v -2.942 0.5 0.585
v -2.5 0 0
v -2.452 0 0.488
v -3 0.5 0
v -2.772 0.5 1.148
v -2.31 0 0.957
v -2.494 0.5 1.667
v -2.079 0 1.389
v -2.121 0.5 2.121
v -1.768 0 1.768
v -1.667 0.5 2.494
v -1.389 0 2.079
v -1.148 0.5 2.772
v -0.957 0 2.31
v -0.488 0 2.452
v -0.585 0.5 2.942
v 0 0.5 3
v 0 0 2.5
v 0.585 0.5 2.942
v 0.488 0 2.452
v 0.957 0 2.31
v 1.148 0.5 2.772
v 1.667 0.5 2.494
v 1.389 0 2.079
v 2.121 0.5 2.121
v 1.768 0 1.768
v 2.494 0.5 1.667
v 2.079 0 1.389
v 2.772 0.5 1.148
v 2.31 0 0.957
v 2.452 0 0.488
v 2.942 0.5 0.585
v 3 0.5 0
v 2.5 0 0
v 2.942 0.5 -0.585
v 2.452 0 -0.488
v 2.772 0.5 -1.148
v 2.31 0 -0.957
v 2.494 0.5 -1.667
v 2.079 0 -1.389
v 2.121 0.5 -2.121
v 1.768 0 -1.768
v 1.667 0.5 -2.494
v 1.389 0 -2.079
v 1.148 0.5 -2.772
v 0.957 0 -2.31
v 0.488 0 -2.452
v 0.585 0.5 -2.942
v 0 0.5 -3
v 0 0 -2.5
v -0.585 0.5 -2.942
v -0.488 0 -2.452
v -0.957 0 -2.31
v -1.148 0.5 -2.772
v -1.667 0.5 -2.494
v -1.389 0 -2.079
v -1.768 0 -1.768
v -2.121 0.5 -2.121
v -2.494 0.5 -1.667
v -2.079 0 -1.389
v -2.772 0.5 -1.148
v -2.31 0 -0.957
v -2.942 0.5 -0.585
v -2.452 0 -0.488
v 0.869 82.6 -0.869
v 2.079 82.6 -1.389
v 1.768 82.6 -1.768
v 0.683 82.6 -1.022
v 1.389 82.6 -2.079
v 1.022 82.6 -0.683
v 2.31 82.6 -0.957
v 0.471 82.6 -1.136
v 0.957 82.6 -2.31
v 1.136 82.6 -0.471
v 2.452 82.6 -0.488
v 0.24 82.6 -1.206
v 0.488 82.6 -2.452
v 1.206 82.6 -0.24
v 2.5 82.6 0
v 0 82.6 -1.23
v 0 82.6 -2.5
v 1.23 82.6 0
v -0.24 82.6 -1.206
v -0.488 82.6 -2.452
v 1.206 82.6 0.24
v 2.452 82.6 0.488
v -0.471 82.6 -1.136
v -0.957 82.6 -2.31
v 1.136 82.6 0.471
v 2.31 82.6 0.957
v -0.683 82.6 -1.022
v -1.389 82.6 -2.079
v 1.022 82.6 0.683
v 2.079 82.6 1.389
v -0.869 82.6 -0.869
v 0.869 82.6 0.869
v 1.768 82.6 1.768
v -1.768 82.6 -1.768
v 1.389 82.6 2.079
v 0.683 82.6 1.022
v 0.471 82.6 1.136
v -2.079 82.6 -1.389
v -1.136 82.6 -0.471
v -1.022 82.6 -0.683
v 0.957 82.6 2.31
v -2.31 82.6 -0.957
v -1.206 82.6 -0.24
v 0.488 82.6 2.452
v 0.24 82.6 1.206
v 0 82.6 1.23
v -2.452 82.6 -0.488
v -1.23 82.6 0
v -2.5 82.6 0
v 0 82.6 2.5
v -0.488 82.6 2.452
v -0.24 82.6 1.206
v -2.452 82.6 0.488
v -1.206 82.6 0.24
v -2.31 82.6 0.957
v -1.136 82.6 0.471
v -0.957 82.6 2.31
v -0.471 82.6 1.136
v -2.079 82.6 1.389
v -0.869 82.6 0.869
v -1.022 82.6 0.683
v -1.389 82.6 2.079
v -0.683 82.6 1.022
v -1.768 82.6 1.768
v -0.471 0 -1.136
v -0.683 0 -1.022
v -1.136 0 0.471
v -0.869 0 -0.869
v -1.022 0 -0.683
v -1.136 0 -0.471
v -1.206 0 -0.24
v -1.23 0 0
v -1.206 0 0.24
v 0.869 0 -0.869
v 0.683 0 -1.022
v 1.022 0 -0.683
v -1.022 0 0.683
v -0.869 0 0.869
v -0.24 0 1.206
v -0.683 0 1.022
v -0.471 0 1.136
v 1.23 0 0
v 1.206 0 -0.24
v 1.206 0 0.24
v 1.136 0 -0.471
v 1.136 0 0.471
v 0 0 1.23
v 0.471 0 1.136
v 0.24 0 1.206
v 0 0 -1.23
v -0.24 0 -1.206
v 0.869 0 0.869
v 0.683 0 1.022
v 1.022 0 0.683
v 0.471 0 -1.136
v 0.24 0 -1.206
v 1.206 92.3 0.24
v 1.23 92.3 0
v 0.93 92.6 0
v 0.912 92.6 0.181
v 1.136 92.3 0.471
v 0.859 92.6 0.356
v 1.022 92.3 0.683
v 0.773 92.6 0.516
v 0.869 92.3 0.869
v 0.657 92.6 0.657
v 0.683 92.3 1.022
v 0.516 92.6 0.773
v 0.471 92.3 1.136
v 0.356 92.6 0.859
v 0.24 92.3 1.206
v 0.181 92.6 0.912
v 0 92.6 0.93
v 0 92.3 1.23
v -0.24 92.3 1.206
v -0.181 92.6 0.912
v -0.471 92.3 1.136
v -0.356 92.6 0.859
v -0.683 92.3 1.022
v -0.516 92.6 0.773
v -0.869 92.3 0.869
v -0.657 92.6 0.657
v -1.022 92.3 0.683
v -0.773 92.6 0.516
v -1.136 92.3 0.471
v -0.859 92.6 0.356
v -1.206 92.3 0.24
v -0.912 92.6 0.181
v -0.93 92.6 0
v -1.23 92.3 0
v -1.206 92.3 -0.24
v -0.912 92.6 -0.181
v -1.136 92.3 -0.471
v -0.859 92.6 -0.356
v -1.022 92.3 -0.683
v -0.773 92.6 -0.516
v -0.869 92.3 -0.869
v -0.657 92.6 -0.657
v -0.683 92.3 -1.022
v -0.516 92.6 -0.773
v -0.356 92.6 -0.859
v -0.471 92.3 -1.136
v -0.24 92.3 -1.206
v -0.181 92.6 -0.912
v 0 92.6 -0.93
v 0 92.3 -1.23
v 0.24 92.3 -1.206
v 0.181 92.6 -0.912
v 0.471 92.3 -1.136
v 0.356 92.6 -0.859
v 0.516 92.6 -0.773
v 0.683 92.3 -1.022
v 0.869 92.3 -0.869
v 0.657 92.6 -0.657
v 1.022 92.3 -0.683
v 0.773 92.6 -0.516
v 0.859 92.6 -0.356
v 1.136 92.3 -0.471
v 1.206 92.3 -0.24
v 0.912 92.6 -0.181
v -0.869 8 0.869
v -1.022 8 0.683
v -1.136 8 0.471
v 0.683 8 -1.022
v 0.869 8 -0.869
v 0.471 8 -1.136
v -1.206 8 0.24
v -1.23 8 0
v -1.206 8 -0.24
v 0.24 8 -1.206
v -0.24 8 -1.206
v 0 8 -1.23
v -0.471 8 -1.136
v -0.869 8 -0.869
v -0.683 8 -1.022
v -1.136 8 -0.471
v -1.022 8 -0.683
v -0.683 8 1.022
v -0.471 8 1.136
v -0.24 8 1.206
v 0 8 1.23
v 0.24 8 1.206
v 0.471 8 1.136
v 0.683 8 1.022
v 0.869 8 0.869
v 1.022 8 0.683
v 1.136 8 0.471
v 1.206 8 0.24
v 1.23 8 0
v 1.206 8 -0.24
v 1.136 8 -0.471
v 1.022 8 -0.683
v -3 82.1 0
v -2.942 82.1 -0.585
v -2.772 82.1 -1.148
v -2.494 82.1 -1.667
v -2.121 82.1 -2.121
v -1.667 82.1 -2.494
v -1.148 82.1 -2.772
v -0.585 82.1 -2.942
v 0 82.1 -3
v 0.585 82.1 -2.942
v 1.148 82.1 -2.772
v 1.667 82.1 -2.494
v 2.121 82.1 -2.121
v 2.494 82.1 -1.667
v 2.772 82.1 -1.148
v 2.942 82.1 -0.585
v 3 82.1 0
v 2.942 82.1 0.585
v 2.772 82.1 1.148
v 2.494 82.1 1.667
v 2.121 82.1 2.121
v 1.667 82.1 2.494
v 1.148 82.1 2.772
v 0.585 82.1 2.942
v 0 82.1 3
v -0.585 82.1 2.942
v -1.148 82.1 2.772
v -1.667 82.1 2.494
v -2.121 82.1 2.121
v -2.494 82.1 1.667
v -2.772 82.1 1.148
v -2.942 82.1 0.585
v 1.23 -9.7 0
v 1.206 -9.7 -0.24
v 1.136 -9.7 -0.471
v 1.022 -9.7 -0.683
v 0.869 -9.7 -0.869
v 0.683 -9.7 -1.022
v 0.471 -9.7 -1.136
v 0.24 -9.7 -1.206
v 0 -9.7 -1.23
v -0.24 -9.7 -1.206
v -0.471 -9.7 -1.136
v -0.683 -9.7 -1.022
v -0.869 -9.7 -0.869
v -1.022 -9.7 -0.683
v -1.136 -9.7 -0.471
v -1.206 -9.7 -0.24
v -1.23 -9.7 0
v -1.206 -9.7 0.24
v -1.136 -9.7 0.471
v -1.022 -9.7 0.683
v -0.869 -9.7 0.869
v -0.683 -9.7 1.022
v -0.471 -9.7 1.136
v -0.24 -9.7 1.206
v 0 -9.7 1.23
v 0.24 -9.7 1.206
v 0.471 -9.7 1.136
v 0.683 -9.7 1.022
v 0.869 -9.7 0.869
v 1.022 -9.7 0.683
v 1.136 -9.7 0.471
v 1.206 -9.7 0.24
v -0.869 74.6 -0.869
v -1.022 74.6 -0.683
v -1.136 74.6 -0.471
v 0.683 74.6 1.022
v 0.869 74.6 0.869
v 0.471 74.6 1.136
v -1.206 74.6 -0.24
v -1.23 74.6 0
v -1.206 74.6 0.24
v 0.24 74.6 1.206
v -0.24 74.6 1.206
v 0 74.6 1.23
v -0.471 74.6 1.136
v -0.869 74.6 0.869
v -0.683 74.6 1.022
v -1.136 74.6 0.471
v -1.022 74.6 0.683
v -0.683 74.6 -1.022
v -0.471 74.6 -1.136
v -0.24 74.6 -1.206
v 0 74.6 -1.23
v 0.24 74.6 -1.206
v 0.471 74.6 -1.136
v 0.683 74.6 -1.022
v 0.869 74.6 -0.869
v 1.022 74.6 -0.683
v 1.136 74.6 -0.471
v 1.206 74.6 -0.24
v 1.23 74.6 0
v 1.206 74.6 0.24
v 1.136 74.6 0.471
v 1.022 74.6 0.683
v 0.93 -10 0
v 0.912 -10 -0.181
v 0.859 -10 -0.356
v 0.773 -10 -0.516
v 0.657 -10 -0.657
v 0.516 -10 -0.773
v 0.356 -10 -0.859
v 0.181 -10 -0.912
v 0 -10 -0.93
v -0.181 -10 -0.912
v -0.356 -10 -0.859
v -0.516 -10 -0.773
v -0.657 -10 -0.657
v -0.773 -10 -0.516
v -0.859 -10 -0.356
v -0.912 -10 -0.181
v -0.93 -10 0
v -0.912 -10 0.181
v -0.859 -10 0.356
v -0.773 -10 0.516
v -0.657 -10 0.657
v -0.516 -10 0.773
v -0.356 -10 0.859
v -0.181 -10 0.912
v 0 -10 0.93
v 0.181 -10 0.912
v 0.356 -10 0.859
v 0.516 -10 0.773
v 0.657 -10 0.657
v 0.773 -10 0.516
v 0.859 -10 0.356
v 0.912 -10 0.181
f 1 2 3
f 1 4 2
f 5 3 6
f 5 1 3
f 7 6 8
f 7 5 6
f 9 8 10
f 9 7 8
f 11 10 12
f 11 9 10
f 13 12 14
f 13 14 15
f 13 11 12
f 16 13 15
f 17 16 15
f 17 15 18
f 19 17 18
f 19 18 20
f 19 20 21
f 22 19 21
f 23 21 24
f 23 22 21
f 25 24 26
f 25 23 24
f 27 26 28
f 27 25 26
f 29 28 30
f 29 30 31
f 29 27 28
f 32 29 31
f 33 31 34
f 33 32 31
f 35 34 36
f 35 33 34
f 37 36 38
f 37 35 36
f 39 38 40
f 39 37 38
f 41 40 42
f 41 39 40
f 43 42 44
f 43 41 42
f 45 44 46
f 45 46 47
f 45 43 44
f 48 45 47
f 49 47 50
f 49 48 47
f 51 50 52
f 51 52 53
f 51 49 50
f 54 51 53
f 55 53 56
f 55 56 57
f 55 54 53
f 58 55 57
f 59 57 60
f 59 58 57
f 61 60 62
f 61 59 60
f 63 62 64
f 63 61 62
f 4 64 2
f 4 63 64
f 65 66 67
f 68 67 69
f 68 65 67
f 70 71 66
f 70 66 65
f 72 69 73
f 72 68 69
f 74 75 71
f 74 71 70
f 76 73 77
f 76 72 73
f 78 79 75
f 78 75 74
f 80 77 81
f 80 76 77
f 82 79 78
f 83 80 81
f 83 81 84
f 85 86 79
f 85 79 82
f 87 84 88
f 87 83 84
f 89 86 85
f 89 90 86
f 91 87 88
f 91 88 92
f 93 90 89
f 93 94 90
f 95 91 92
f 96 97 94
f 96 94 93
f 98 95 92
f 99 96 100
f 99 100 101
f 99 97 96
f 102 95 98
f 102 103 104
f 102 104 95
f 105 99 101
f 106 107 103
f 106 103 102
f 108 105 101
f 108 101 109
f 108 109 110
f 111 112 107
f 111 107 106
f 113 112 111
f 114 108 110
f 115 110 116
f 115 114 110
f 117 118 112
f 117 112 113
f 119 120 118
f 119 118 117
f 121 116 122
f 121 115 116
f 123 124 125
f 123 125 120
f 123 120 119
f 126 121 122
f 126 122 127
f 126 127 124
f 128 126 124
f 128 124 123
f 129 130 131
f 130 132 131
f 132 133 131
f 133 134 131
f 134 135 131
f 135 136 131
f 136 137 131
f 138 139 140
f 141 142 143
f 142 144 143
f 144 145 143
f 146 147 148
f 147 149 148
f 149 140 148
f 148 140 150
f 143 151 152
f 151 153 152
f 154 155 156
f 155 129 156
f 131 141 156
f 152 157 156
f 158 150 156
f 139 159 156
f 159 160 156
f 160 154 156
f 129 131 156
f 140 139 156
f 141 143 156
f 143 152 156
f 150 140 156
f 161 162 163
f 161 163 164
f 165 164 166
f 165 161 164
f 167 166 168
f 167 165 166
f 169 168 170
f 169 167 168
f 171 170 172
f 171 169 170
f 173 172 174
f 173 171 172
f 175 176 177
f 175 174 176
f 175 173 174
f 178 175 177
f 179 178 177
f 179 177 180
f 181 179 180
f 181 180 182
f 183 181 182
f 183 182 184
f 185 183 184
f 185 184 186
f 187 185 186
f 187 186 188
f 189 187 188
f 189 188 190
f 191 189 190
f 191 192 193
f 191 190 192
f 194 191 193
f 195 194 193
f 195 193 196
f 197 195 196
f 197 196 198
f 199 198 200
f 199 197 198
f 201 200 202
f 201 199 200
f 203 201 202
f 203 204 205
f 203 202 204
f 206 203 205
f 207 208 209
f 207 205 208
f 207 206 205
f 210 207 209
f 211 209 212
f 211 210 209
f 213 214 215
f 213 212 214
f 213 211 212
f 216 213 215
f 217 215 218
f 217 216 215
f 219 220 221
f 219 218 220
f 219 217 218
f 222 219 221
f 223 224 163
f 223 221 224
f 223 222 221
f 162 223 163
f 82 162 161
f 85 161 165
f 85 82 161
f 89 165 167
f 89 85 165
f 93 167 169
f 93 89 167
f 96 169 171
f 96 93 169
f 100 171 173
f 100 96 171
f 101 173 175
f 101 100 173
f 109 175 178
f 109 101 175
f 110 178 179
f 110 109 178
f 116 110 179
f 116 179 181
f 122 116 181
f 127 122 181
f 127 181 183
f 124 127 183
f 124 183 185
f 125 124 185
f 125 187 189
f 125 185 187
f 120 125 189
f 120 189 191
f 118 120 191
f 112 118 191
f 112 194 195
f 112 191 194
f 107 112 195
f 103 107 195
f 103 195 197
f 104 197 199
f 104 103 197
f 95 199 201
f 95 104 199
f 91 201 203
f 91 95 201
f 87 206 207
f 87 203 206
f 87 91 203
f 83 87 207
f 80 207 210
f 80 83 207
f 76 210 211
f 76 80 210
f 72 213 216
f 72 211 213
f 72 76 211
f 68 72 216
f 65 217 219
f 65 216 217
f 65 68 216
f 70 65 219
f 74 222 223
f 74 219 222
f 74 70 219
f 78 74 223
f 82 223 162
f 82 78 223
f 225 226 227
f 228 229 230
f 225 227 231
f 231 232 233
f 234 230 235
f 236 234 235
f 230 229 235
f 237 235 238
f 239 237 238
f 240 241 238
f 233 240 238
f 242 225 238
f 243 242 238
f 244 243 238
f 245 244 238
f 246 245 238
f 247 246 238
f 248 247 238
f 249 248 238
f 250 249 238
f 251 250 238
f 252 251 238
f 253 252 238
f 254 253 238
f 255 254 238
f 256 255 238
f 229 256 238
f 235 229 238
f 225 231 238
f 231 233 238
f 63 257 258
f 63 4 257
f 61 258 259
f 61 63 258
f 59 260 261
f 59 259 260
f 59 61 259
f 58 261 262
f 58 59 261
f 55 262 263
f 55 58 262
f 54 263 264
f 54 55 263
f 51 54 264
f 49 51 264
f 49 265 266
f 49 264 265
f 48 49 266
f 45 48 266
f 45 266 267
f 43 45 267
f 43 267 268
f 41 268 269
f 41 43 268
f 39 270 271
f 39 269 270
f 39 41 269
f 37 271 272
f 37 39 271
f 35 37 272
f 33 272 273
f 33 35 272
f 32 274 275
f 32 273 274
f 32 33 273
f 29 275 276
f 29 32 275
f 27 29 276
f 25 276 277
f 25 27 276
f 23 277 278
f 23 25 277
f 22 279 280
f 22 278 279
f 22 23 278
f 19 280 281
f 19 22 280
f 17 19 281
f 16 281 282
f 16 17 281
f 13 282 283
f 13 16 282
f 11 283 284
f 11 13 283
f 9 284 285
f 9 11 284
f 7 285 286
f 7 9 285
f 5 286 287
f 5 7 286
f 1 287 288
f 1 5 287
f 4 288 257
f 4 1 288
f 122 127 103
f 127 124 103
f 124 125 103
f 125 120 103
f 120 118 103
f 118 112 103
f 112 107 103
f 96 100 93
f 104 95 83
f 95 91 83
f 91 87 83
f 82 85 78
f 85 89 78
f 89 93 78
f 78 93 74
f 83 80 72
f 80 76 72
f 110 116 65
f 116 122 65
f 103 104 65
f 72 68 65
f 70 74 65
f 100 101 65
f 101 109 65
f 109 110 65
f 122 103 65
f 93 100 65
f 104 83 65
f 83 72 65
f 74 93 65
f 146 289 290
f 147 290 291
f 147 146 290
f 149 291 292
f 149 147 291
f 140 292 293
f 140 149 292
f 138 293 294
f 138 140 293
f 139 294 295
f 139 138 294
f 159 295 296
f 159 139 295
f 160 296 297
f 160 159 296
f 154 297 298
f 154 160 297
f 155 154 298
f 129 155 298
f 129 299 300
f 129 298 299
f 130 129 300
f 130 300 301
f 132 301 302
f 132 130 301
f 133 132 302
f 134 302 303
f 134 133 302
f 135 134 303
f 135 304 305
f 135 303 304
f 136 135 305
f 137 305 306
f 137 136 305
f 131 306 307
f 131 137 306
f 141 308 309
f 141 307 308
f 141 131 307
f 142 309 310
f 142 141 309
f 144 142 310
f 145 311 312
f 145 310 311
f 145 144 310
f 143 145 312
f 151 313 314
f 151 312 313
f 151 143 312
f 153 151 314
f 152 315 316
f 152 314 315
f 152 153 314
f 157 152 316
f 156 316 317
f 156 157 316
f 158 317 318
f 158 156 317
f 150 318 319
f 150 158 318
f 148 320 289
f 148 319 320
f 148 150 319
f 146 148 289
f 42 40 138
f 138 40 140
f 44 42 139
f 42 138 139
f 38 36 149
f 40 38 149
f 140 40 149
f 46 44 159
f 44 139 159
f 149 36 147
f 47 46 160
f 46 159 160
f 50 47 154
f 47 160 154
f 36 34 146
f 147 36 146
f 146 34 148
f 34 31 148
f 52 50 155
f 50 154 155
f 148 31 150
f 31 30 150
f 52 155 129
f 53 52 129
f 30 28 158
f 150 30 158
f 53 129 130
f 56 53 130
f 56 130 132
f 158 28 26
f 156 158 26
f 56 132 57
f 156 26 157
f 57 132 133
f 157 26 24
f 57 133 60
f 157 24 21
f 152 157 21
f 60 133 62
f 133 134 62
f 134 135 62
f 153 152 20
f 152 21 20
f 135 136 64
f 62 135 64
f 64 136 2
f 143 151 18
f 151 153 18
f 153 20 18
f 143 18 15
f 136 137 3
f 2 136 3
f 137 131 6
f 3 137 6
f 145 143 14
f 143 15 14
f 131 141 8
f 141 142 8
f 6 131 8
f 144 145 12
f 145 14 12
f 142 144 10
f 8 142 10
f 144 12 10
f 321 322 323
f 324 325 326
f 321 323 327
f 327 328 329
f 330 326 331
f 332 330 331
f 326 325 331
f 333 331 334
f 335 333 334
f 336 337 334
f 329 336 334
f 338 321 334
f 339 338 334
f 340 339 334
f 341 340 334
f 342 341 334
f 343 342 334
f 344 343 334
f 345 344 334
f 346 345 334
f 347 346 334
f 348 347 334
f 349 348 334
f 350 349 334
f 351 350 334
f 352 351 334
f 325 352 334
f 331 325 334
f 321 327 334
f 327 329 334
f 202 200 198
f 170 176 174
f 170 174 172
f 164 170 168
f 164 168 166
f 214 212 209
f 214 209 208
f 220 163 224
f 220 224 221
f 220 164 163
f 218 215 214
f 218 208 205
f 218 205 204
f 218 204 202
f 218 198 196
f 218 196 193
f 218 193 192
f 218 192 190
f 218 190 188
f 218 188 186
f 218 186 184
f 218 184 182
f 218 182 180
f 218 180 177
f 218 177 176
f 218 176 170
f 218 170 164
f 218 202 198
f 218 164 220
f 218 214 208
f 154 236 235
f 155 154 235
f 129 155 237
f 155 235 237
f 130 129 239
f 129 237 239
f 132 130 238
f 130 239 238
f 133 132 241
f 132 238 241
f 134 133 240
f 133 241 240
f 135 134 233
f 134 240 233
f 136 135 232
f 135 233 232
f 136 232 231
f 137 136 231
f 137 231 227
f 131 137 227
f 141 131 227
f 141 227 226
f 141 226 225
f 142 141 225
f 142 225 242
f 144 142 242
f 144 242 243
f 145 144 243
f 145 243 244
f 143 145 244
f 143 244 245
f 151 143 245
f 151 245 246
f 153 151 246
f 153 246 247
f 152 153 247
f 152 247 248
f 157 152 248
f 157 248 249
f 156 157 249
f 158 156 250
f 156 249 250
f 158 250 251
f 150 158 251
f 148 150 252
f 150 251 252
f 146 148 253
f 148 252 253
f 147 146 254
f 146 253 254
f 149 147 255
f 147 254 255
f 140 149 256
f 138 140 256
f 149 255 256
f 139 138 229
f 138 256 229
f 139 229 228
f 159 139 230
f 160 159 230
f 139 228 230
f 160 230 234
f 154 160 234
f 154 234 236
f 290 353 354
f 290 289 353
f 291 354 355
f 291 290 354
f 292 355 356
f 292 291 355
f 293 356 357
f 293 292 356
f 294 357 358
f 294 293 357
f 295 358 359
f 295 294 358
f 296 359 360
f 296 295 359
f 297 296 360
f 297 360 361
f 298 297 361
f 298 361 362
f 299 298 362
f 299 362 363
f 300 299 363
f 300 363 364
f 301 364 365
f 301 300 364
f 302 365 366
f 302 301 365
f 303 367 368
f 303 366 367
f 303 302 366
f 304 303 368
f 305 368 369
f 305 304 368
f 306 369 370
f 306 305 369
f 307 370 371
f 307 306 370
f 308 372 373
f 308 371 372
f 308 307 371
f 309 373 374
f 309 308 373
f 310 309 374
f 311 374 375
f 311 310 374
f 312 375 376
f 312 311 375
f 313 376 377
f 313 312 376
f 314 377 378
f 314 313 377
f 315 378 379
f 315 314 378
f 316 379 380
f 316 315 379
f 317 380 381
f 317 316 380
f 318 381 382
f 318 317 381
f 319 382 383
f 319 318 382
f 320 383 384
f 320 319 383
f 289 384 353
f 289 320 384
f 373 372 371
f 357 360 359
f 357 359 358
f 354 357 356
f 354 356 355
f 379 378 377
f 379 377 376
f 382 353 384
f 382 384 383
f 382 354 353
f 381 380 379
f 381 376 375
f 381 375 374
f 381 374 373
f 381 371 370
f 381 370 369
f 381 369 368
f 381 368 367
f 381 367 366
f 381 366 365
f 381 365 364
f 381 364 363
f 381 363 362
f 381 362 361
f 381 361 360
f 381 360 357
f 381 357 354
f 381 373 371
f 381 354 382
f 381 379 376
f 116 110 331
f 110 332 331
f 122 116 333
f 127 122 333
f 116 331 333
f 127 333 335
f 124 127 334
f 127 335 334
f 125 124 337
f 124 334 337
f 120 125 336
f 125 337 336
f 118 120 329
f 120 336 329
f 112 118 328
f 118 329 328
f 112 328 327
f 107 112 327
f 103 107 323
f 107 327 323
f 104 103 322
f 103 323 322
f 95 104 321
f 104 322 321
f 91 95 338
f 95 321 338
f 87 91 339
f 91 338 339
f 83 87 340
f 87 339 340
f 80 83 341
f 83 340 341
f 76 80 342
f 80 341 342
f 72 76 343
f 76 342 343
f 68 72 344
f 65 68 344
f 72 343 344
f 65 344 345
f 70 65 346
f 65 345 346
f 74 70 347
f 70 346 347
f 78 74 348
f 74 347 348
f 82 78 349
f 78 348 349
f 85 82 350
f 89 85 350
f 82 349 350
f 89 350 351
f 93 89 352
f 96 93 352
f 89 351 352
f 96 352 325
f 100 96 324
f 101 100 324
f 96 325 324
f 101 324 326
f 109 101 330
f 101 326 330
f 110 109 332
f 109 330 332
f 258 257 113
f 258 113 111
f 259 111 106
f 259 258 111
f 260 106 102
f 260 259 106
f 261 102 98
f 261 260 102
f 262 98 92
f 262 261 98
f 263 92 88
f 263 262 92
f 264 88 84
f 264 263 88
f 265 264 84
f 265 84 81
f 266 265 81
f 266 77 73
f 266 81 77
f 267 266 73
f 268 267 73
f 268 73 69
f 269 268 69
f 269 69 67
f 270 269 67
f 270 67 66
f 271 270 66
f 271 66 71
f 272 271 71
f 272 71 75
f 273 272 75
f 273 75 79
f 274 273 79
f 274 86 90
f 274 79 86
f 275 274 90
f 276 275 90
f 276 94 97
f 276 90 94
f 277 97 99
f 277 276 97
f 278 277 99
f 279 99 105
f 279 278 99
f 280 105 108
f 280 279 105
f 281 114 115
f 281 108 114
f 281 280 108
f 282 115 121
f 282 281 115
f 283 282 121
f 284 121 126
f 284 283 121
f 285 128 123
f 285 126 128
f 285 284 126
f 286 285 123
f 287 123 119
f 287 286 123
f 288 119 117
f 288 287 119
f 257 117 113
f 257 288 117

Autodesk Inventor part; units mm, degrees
ref_plane "YZ Plane" through (0, 0, 0) normal (1, 0, 0) x (0, 1, 0)
ref_plane "XZ Plane" through (0, 0, 0) normal (0, 1, 0) x (-1, 0, 0)
ref_plane "XY Plane" through (0, 0, 0) normal (0, 0, 1) x (1, 0, 0)
sketch "Sketch1" plane through (0, 0, 0) normal (0, 1, 0) x (-1, 0, 0)
  circle A0 centre (0, 0) radius 3
  dimension "d0" = 6
extrude "Extrusion1" add sketch "Sketch1" along normal blind 82.6
sketch "Sketch2" plane through (0, 82.6, 0) normal (0, 1, 0) x (1, 0, 0)
  circle A0 centre (0, 0) radius 3 projected
hole "Hole1" at (0, 82.6, 0) direction (0, -1, 0) diameter 2.459 depth 8 thread size "M3x0.5" class "6H" standard "ISO Metric profile"
sketch "Sketch3" plane through (0, 0, 0) normal (0, -1, 0) x (1, 0, 0)
  circle A0 centre (0, 0) radius 3 projected
hole "Hole2" at (0, 0, 0) direction (0, 1, 0) diameter 2.459 depth 8 thread size "M3x0.5" class "6H" standard "ISO Metric profile"
chamfer "Chamfer1" distance 0.5 angle 45 2 edges at (3, 0, 0) (3, 82.6, 0)
sketch "Sketch4" plane through (0, 0, 0) normal (0, -1, 0) x (1, 0, 0)
  circle A0 centre (0, 0) radius 1.2295 projected
extrude "Extrusion2" add sketch "Sketch4" along normal blind 10
sketch "Sketch5" plane through (0, 82.6, 0) normal (0, 1, 0) x (1, 0, 0)
  circle A0 centre (0, 0) radius 1.2295 projected
extrude "Extrusion3" add sketch "Sketch5" along normal blind 10
thread "Thread1" size "M3x0.5" class "6g" standard "ANSI Metric M Profile" full length
thread "Thread2" size "M3x0.5" class "6g" standard "ANSI Metric M Profile" full length
chamfer "Chamfer2" distance 0.3 angle 45 1 edges at (-1.2295, -10, 0)
chamfer "Chamfer3" distance 0.3 angle 45 1 edges at (-1.2295, 92.6, 0)
properties part number "hridel1" material "Iron, Cast"
